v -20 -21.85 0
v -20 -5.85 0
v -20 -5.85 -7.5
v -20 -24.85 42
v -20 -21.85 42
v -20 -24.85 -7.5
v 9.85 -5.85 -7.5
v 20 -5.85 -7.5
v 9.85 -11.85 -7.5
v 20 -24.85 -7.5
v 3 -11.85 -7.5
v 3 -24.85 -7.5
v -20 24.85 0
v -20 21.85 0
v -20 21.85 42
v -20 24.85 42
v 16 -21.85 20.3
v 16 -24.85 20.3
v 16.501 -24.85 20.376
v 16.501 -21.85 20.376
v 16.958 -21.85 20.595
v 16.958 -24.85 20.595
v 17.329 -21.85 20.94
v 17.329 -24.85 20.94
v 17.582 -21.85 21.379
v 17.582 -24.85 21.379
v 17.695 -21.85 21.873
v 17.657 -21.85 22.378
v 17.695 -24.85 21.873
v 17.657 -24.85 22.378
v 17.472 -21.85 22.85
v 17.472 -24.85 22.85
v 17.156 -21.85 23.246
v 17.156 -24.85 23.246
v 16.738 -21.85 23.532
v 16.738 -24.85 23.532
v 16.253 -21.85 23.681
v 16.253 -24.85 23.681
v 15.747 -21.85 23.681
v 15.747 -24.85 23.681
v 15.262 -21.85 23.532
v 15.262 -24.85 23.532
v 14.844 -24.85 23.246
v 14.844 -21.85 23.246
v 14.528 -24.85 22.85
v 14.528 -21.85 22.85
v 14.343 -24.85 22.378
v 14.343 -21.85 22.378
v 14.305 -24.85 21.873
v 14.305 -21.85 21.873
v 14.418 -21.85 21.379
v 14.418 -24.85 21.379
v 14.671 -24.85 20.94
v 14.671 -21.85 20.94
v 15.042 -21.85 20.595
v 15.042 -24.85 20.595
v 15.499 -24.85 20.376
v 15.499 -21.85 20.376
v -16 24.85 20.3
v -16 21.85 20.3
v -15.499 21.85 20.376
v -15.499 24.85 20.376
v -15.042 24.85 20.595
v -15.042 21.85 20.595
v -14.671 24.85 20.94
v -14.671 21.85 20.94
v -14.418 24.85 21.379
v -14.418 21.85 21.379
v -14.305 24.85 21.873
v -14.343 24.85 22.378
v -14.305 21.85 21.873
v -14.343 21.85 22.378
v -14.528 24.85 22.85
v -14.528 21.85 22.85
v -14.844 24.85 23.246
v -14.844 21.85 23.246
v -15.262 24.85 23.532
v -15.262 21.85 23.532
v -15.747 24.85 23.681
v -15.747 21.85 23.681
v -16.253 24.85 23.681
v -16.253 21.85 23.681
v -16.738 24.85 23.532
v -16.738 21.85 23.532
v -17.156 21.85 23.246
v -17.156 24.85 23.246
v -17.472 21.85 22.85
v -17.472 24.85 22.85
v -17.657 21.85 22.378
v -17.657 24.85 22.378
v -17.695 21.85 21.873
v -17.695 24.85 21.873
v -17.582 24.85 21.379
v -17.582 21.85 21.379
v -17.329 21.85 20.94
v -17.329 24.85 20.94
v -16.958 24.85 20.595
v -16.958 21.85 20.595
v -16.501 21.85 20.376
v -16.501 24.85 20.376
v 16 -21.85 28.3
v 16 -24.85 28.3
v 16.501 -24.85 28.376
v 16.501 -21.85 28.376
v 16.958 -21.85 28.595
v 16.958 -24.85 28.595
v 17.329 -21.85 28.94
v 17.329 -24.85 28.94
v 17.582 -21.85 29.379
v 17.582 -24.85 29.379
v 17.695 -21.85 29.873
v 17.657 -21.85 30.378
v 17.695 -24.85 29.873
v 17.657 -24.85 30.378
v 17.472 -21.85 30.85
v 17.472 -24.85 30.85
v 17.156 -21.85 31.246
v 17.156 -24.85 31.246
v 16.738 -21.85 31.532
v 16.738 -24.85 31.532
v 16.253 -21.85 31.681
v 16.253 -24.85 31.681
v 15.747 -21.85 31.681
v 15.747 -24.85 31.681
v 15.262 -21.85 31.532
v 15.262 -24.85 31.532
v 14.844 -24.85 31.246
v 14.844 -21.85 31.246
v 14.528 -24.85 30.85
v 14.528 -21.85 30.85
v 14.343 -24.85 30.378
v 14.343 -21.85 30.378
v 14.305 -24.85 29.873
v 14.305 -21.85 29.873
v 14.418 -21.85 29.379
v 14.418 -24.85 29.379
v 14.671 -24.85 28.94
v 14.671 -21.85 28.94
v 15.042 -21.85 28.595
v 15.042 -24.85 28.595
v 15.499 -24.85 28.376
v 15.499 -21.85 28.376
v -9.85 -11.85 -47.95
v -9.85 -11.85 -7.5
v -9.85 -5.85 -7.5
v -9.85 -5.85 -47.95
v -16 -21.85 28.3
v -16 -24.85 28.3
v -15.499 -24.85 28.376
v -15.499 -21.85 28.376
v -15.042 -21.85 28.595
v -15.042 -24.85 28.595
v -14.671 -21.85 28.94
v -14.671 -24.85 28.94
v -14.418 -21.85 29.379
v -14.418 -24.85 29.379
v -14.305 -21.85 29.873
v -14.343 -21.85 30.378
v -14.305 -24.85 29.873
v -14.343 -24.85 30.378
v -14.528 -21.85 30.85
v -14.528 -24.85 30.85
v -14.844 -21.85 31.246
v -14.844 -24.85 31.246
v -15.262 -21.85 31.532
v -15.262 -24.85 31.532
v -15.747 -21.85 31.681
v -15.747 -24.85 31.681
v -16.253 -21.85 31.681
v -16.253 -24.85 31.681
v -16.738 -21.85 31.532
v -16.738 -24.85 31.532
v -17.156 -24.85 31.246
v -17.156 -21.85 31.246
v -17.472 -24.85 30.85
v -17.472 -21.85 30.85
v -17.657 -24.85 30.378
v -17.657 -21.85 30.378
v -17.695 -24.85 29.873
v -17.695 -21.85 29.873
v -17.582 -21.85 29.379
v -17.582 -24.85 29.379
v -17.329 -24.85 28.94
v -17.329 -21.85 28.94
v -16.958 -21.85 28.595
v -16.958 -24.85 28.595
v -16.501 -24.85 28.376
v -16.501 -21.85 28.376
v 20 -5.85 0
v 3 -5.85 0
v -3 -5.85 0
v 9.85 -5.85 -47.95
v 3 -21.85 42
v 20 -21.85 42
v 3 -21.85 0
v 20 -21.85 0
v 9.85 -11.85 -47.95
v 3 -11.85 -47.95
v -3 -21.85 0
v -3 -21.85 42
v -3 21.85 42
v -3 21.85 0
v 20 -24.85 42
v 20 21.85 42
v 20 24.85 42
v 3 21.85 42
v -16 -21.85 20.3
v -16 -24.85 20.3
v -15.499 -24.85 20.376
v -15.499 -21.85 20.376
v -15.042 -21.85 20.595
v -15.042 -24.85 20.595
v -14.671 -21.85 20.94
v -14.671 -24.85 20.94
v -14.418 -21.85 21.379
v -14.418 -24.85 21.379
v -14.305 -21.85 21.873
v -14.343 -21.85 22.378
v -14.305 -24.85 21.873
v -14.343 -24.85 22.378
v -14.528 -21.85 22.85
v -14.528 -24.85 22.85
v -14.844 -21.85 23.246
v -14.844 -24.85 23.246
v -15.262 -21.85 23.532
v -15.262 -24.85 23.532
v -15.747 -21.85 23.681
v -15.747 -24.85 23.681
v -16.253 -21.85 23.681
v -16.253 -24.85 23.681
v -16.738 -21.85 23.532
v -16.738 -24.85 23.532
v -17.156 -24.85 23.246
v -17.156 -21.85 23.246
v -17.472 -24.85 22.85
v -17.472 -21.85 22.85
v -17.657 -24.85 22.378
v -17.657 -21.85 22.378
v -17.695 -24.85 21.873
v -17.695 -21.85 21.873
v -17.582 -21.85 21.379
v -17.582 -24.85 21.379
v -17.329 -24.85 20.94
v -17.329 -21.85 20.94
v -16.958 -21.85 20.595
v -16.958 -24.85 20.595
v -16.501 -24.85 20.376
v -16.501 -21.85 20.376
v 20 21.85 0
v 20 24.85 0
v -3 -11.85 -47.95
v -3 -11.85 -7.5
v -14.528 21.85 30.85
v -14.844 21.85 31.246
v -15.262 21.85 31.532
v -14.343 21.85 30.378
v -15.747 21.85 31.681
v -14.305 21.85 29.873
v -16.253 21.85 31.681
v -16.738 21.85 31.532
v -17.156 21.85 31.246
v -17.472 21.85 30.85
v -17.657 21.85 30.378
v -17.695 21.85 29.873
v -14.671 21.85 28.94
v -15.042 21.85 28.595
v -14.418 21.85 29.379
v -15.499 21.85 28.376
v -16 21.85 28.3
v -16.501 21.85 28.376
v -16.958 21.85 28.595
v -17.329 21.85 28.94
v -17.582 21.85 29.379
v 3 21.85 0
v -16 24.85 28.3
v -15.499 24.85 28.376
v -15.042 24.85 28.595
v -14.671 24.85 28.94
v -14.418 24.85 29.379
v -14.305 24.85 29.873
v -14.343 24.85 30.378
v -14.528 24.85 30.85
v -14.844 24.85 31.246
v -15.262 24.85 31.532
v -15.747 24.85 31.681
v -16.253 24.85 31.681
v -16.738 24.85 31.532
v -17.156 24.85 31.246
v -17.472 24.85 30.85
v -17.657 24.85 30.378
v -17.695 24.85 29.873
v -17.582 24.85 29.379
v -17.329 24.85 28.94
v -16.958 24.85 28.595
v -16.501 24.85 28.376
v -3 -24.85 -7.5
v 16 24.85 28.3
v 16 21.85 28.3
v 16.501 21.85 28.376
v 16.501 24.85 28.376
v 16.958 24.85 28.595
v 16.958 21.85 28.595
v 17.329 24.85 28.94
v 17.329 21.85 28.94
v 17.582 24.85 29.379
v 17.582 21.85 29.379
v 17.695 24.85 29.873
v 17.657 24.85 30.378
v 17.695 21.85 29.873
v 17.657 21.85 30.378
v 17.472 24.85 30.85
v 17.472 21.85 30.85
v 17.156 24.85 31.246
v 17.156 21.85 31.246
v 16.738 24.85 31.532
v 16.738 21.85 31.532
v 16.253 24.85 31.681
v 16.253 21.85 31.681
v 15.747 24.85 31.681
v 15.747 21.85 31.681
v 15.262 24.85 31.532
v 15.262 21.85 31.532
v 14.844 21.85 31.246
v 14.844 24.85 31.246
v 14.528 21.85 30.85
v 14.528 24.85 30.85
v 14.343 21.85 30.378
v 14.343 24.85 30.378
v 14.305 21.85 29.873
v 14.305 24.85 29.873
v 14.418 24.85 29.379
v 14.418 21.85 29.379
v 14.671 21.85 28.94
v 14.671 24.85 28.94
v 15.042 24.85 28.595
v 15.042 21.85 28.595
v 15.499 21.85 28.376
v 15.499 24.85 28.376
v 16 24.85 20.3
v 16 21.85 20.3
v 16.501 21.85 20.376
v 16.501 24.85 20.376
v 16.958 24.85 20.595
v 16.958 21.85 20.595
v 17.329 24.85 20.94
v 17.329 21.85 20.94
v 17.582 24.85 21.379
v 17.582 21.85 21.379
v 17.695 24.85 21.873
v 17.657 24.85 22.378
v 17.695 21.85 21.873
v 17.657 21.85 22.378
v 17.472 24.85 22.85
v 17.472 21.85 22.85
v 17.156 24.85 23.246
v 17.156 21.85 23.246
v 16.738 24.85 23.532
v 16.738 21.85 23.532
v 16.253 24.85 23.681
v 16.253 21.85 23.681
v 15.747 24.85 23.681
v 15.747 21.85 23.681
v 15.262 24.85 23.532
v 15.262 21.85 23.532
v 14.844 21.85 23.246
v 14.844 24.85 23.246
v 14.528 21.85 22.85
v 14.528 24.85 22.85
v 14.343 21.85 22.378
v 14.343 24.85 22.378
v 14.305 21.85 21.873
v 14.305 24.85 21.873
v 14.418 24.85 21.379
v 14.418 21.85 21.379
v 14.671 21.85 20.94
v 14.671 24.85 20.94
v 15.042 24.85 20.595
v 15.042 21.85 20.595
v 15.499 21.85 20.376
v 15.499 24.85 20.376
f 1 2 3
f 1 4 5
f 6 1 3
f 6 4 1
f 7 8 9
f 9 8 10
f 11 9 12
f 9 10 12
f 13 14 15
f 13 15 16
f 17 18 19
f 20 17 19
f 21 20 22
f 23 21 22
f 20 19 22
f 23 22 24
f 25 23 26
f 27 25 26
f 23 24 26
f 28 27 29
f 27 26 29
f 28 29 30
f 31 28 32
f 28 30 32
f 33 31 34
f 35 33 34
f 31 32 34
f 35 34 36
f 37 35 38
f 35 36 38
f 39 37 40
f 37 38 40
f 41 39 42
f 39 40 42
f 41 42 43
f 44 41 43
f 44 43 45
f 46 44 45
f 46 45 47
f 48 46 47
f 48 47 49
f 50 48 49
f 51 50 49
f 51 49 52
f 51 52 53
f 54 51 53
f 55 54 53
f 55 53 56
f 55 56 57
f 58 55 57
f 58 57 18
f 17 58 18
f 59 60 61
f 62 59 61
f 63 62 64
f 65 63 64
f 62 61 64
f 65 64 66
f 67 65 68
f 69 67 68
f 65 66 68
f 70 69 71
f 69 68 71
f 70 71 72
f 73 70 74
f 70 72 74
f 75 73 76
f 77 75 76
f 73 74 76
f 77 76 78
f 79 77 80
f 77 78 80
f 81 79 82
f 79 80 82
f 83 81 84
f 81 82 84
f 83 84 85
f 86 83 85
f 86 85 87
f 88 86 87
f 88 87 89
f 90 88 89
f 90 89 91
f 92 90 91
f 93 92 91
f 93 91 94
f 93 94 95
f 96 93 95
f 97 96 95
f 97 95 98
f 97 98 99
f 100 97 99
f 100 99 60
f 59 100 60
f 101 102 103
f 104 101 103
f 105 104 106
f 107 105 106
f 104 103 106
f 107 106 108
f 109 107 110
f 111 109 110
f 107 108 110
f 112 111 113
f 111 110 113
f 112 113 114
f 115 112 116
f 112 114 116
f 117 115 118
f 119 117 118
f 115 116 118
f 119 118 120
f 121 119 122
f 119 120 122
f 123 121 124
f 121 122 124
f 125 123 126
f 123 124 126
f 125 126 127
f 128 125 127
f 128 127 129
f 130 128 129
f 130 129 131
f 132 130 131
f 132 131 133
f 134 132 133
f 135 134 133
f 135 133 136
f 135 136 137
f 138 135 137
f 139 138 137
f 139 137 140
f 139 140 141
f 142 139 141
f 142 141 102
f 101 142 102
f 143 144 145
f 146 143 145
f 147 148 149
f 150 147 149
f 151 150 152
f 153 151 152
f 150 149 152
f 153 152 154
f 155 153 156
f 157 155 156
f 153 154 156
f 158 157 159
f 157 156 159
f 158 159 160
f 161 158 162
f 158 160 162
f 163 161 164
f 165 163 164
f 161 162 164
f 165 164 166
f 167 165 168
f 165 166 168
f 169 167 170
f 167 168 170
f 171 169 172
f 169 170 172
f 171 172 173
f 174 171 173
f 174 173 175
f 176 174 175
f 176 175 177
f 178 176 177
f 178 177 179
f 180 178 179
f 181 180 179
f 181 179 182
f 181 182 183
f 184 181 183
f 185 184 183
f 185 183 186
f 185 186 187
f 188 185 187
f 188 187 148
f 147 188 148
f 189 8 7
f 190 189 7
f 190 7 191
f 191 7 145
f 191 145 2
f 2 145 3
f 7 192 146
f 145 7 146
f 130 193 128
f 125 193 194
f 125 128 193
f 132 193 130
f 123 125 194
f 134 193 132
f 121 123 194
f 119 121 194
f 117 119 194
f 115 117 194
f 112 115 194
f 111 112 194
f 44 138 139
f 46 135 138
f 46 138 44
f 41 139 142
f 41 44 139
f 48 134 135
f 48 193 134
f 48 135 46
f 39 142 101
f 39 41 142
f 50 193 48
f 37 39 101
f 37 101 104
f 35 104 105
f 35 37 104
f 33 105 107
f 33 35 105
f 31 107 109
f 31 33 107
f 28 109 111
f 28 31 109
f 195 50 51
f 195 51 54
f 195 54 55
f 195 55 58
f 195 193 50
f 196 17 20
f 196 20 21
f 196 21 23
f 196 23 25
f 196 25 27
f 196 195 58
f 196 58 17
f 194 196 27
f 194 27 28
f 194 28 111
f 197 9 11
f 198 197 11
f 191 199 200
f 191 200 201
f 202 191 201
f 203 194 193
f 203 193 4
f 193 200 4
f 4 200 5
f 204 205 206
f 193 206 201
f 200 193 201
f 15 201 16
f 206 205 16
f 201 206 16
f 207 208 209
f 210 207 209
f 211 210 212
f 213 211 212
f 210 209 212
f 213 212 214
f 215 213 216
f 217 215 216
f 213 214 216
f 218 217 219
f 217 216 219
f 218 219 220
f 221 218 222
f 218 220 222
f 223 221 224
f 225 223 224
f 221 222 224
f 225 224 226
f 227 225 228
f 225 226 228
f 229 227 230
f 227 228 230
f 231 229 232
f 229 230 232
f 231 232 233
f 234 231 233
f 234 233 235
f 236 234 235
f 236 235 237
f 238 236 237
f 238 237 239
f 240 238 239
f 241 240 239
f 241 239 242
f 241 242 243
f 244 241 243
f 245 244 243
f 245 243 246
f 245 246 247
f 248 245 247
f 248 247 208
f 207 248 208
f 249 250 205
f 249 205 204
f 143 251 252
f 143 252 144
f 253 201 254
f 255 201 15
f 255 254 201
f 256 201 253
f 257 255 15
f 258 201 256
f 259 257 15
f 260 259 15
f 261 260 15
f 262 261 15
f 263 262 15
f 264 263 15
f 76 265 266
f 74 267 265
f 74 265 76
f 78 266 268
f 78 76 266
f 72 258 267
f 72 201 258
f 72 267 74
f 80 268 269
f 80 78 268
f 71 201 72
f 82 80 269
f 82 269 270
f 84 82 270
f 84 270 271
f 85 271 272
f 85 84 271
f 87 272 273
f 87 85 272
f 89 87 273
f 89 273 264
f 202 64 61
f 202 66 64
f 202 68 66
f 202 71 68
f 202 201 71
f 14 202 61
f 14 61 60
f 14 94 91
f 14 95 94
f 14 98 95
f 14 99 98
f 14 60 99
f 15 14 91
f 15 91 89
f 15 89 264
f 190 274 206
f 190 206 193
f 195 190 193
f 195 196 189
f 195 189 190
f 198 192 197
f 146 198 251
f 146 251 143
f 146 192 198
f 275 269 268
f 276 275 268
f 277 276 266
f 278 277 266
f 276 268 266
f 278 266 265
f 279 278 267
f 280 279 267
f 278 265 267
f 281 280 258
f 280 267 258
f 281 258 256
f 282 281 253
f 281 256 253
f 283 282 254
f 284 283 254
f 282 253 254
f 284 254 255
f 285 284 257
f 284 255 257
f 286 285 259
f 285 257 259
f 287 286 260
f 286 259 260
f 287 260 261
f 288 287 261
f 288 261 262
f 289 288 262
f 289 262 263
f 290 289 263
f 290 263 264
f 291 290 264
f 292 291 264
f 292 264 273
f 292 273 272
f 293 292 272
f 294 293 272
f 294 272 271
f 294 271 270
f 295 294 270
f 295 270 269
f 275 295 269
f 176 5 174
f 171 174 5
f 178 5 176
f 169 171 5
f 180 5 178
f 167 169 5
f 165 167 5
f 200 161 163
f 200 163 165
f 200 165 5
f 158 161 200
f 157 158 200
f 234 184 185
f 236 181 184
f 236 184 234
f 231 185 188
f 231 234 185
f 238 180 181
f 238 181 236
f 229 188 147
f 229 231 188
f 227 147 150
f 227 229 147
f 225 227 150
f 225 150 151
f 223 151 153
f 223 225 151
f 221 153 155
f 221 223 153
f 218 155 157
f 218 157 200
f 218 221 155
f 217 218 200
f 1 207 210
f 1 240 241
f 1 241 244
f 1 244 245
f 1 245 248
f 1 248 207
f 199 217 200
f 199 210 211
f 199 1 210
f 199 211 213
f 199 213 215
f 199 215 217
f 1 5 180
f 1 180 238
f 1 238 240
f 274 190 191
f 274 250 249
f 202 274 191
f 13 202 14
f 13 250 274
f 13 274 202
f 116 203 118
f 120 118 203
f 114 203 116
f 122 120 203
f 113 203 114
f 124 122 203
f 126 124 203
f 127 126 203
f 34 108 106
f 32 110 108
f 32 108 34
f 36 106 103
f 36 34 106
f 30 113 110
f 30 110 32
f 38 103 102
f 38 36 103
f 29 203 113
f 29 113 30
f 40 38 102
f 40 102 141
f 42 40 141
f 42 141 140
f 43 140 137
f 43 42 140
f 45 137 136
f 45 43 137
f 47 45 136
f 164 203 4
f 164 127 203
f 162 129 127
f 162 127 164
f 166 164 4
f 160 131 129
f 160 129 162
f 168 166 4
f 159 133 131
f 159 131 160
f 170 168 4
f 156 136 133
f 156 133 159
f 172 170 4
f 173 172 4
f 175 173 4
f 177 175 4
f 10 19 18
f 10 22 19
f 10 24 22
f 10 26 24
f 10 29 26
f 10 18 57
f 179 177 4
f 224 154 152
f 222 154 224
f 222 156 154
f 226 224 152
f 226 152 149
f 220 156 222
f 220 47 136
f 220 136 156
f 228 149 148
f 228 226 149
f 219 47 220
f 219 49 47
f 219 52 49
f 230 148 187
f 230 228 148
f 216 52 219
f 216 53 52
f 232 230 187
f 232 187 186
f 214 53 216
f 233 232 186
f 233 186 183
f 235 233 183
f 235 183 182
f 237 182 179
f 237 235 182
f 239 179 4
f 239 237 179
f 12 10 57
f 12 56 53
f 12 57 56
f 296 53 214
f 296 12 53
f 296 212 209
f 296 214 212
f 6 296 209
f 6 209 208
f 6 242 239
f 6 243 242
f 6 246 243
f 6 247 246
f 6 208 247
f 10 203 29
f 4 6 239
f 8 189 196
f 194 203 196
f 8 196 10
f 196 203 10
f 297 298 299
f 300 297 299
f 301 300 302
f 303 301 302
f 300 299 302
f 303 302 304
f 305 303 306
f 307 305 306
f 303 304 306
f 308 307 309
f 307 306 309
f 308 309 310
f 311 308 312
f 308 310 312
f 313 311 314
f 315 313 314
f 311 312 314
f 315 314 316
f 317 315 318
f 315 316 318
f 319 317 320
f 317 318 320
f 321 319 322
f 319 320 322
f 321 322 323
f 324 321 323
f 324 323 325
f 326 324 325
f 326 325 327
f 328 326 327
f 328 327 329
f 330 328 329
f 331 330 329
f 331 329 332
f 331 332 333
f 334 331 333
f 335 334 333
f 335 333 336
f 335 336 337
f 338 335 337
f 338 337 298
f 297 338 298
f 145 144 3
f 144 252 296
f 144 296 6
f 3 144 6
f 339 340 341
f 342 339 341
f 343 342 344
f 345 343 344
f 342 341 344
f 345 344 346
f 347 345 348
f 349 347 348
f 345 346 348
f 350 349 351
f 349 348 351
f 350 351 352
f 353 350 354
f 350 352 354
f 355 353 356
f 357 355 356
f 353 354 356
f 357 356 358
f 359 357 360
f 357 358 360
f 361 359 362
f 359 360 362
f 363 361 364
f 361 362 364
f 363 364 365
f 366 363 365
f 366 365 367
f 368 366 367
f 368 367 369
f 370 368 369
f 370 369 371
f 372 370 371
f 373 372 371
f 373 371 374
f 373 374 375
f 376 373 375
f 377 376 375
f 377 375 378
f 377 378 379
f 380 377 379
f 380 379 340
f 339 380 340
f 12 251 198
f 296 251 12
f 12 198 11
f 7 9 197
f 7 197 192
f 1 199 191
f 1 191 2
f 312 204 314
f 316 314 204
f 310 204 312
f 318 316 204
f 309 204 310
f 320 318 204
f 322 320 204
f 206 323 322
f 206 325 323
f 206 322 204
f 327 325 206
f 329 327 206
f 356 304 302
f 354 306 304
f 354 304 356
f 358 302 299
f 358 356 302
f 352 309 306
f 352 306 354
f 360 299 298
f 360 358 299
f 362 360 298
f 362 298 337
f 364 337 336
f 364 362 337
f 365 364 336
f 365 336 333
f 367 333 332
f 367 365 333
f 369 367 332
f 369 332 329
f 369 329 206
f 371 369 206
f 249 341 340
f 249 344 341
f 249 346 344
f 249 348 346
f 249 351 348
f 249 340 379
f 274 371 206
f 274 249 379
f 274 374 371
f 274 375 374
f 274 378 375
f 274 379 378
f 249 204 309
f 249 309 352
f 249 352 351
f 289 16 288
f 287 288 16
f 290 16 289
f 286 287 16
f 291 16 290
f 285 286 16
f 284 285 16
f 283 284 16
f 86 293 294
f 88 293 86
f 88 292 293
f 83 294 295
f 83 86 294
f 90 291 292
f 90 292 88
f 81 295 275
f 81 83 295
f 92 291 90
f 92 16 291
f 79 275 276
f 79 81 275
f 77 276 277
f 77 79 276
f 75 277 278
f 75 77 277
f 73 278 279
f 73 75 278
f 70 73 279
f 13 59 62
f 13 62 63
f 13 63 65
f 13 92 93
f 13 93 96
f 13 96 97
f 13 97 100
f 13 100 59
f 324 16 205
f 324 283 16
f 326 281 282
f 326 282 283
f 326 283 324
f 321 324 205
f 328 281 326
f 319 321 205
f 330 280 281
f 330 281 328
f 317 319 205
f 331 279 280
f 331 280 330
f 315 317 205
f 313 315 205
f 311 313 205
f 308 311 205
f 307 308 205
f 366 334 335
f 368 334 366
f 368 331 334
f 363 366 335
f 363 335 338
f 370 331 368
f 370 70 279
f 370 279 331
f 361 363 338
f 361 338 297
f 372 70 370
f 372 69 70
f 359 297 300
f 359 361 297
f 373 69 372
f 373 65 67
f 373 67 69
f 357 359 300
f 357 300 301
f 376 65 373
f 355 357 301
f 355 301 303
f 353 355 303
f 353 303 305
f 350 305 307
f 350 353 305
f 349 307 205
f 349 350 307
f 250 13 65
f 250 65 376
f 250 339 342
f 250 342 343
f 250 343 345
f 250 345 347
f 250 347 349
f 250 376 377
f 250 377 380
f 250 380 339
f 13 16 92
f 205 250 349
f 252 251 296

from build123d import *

# Parameters (mm, degrees)
BOSS_EXTRUDE1_DEPTH = 42
SKETCH2_W           = 40
SKETCH2_H           = 7.5
BOSS_EXTRUDE2_DEPTH = 19
SKETCH3_W           = 19.7
SKETCH3_H           = 6
BOSS_EXTRUDE3_DEPTH = 40.45
RIB1_REACH          = 59.591
SKETCH4_WALL_W      = 159.669704532
SKETCH4_WALL_H      = 6
SKETCH7_R           = 1.7
CUT_EXTRUDE1_DEPTH  = 72.897792038


with BuildPart() as part:
    # Sketch1 → Boss-Extrude1 (new body)
    with BuildSketch(Plane.XY):
        Polygon((-3, -21.85), (-3, 21.85), (-20, 21.85), (-20, 24.85), (20, 24.85), (20, 21.85), (3, 21.85), (3, -21.85), (20, -21.85), (20, -24.85), (-20, -24.85), (-20, -21.85), align=None)
    extrude(amount=BOSS_EXTRUDE1_DEPTH)

    # Sketch2 → Boss-Extrude2 (add)
    with BuildSketch(Plane(origin=(0, -24.85, 0), x_dir=(-1, 0, 0), z_dir=(0, -1, 0))):
        with Locations((0, 3.75)):
            Rectangle(SKETCH2_W, SKETCH2_H)
    extrude(amount=-BOSS_EXTRUDE2_DEPTH)

    # Sketch3 → Boss-Extrude3 (add)
    with BuildSketch(Plane(origin=(0, 0, -7.5), x_dir=(-1, 0, 0), z_dir=(0, 0, -1))):
        with Locations((0, -8.85)):
            Rectangle(SKETCH3_W, SKETCH3_H)
    extrude(amount=BOSS_EXTRUDE3_DEPTH)

    # Sketch4 wall → Rib1 (add, up to next)
    with BuildSketch(Plane(origin=(0, -18.35, -27.725), x_dir=(0, -0.305971086836, 0.952040804809), z_dir=(0, -0.952040804809, -0.305971086836)), mode=Mode.PRIVATE) as rib1_sk1:
        Rectangle(SKETCH4_WALL_W, SKETCH4_WALL_H)
    rib1_tool1 = extrude(rib1_sk1.sketch, amount=-RIB1_REACH, mode=Mode.PRIVATE) - part.part
    add(rib1_tool1.solids().sort_by_distance((0, -18.35, -27.725))[0])

    # Sketch7 → Cut-Extrude1 (cut, through all)
    with BuildSketch(Plane.XZ.offset(24.85)):
        with Locations(Location((16, 30, 0), (0, 0, 270))):
            Circle(SKETCH7_R)
        with Locations(Location((16, 22, 0), (0, 0, 270))):
            Circle(SKETCH7_R)
        with Locations(Location((-16, 22, 0), (0, 0, 270))):
            Circle(SKETCH7_R)
        with Locations(Location((-16, 30, 0), (0, 0, 270))):
            Circle(SKETCH7_R)
    extrude(amount=-CUT_EXTRUDE1_DEPTH, mode=Mode.SUBTRACT)


solid = part.part
